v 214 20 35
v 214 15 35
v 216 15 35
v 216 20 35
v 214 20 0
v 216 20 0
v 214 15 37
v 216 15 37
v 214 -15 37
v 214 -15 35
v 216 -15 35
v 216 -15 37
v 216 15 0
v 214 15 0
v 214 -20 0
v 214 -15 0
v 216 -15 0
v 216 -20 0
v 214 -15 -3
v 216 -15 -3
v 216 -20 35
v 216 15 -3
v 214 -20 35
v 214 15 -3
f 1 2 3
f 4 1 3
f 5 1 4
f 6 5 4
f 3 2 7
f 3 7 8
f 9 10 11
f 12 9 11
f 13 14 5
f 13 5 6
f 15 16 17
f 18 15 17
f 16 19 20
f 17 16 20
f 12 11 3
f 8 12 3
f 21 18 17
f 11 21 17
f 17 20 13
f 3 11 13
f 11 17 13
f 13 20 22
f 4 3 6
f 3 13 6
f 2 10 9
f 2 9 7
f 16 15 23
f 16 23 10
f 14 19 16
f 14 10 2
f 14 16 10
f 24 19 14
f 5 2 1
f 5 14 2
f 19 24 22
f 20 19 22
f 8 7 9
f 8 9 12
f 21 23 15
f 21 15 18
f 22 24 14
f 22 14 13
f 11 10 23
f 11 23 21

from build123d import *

# Parameters (mm, degrees)
ESTRUSIONE_ESTRUSIONE1_DEPTH      = 37
ESTRUSIONE_ESTRUSIONE1_DEPTH_BACK = 3
SCHIZZO1_W                        = 2
SCHIZZO1_H                        = 30
SCHIZZO2_W                        = 2
SCHIZZO2_H                        = 35
ESTRUSIONE_ESTRUSIONE2_DEPTH      = 5


with BuildPart() as part:
    # Schizzo1 → Estrusione-Estrusione1 (new, two sides: drawn at the far end of the back side and taken through both)
    with BuildSketch(Plane.XY.offset(-ESTRUSIONE_ESTRUSIONE1_DEPTH_BACK)):
        with Locations((215, 0)):
            Rectangle(SCHIZZO1_W, SCHIZZO1_H)
    extrude(amount=ESTRUSIONE_ESTRUSIONE1_DEPTH + ESTRUSIONE_ESTRUSIONE1_DEPTH_BACK)

    # Schizzo2 → Estrusione-Estrusione2 (add)
    with BuildSketch(Plane.XZ.offset(15)):
        with Locations((215, 17.5)):
            Rectangle(SCHIZZO2_W, SCHIZZO2_H)
    estrusione_estrusione2 = extrude(amount=ESTRUSIONE_ESTRUSIONE2_DEPTH)

    # Specchia1: Estrusione-Estrusione2 across plane
    add(estrusione_estrusione2.mirror(Plane.ZX))


solid = part.part
